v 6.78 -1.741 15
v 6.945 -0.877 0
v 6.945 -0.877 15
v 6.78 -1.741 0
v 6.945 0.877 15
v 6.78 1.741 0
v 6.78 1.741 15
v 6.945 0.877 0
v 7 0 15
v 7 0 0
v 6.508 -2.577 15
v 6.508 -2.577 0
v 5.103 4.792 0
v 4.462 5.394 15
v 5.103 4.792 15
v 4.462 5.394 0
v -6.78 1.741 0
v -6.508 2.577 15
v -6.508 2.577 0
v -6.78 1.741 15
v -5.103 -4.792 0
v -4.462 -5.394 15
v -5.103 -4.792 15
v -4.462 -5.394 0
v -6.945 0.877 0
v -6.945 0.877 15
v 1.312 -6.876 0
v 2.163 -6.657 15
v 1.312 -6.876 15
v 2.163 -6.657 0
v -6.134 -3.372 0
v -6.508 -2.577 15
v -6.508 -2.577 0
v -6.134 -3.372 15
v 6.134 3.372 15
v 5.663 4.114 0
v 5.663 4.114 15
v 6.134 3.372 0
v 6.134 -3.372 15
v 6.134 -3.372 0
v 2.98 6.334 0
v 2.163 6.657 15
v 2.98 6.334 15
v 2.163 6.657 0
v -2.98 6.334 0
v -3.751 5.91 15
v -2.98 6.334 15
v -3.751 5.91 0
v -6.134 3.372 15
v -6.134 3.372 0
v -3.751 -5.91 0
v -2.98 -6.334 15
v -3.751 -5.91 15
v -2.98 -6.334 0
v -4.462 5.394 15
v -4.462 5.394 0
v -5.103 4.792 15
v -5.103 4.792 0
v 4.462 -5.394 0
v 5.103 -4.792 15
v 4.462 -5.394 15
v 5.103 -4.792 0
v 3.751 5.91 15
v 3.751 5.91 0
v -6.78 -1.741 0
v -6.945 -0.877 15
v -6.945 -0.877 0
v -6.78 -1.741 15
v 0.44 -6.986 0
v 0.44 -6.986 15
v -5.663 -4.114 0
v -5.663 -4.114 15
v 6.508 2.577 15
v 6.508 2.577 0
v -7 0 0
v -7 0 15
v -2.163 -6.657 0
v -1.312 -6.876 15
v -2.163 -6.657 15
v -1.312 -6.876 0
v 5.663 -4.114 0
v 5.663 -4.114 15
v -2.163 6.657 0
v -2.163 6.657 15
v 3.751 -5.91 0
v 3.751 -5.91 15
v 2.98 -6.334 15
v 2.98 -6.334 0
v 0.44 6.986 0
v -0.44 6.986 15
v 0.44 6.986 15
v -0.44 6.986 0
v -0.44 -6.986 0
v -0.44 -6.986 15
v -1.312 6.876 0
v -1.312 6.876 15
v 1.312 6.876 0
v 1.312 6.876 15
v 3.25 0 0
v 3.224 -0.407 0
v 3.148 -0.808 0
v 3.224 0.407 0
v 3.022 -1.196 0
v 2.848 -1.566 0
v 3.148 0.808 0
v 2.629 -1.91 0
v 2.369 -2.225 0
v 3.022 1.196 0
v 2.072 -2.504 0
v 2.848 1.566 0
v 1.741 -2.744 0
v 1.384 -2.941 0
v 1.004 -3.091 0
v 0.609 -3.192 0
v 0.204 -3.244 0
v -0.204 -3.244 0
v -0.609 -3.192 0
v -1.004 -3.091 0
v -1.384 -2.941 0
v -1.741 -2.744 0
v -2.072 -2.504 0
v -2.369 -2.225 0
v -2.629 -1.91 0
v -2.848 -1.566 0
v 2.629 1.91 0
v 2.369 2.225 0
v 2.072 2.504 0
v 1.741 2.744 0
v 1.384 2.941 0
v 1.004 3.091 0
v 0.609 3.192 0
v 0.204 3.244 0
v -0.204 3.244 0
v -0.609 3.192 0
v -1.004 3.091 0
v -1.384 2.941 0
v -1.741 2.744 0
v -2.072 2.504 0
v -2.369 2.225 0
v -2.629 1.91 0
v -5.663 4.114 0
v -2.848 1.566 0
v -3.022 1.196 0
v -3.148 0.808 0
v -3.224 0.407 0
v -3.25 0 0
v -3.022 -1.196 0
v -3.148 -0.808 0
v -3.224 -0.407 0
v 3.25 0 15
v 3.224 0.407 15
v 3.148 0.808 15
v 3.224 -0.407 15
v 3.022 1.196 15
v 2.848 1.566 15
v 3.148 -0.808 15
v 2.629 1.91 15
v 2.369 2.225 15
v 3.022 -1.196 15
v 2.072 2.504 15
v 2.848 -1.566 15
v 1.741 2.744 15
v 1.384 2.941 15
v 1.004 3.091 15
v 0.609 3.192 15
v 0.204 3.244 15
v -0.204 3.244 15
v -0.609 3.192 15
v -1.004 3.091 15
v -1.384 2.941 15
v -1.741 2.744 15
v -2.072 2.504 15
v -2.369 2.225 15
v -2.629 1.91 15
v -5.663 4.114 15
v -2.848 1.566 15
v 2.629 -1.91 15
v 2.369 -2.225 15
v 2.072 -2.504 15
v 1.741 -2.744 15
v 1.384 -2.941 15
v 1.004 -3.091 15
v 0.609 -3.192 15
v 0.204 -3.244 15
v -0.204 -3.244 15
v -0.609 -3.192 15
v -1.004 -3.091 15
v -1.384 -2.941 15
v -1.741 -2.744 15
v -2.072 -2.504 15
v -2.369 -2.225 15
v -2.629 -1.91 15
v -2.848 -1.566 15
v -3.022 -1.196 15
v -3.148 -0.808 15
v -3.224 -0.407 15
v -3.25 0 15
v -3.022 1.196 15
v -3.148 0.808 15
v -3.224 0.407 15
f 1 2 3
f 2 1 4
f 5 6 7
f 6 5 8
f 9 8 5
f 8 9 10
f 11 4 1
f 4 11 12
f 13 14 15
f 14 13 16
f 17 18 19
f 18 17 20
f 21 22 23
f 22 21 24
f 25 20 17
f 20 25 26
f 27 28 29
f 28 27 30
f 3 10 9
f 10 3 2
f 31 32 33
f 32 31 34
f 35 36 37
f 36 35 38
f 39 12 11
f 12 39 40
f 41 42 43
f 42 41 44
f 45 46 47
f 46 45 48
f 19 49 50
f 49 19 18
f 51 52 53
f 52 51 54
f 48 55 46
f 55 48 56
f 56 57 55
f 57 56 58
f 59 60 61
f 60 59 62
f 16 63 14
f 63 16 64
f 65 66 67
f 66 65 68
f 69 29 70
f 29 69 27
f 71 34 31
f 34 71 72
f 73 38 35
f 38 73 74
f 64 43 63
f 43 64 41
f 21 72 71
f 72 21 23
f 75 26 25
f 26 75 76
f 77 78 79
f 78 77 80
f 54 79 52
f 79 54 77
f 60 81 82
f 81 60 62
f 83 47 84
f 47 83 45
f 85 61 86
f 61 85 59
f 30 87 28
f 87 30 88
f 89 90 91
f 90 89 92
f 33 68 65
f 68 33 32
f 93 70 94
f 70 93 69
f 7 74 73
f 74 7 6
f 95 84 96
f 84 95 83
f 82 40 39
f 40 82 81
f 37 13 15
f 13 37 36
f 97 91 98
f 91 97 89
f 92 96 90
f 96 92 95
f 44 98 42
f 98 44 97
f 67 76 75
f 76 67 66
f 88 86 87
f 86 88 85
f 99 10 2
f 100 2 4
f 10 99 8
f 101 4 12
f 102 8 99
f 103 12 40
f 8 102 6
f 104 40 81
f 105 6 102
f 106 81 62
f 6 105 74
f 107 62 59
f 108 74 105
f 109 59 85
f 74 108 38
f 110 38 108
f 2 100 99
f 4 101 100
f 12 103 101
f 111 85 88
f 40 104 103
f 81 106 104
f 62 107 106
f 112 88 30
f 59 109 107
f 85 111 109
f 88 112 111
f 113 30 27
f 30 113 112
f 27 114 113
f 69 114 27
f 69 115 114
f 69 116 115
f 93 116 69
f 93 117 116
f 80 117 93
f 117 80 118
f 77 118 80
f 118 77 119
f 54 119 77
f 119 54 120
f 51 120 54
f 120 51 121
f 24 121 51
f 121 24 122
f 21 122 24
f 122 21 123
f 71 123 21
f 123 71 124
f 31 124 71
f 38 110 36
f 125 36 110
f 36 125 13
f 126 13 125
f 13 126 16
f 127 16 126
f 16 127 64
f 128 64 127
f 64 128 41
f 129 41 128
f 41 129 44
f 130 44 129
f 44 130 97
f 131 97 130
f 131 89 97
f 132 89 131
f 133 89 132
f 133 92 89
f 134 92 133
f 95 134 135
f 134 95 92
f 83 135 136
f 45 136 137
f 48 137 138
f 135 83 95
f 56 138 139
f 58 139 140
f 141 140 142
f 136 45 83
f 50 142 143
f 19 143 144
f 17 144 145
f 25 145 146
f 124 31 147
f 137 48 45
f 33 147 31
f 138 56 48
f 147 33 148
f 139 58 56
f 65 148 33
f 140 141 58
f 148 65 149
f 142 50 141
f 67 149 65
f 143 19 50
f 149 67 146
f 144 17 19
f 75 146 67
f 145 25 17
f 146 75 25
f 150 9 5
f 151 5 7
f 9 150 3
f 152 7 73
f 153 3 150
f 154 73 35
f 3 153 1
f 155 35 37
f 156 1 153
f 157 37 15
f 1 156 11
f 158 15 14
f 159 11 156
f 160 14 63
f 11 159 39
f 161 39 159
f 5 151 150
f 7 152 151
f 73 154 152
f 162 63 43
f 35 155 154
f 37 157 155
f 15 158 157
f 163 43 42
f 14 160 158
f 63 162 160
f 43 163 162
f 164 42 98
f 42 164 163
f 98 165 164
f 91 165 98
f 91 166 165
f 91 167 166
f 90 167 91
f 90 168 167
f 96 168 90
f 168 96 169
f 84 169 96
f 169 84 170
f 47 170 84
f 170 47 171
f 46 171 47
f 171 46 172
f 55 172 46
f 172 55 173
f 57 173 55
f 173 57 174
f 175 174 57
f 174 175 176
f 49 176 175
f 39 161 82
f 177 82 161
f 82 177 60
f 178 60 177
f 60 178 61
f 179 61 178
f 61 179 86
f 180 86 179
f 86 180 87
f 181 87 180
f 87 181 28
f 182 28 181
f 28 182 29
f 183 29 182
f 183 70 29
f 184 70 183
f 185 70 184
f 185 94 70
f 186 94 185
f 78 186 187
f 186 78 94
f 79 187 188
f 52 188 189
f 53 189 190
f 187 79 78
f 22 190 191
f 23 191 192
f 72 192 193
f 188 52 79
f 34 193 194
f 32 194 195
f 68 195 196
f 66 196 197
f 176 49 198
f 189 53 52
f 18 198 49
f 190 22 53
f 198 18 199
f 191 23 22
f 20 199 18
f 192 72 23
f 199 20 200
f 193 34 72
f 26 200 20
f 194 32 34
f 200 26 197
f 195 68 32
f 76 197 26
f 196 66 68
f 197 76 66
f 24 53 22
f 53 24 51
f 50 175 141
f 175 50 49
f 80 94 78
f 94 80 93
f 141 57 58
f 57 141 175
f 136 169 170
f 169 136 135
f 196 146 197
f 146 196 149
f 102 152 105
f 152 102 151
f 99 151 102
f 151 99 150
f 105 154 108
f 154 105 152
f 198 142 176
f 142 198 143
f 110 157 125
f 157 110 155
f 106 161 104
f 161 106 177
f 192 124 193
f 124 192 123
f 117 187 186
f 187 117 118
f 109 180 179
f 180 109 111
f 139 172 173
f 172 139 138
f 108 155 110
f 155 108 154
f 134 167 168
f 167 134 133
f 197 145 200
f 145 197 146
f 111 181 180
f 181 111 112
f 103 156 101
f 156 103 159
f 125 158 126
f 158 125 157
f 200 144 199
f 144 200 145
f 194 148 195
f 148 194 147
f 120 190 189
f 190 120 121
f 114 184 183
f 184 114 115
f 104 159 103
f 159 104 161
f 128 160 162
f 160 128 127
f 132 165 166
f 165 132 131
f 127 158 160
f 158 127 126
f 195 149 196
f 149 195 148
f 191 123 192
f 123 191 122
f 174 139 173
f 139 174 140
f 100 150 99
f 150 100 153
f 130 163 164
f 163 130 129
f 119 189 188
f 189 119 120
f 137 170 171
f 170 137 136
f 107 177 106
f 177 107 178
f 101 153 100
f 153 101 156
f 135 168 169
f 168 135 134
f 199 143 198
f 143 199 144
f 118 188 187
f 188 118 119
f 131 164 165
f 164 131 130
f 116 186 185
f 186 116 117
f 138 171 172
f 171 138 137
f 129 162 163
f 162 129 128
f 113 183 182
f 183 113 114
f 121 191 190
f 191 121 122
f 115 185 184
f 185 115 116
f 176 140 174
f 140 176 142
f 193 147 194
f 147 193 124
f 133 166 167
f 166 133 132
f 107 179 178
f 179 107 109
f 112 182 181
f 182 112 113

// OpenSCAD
$fn = 50;


difference() {
	union() {
		cylinder(h = 15, r = 7.0000000000);
	}
	union() {
		translate(v = [0.0000000000, 0.0000000000, -100.0000000000]) {
			cylinder(h = 200, r = 3.2500000000);
		}
	}
}
